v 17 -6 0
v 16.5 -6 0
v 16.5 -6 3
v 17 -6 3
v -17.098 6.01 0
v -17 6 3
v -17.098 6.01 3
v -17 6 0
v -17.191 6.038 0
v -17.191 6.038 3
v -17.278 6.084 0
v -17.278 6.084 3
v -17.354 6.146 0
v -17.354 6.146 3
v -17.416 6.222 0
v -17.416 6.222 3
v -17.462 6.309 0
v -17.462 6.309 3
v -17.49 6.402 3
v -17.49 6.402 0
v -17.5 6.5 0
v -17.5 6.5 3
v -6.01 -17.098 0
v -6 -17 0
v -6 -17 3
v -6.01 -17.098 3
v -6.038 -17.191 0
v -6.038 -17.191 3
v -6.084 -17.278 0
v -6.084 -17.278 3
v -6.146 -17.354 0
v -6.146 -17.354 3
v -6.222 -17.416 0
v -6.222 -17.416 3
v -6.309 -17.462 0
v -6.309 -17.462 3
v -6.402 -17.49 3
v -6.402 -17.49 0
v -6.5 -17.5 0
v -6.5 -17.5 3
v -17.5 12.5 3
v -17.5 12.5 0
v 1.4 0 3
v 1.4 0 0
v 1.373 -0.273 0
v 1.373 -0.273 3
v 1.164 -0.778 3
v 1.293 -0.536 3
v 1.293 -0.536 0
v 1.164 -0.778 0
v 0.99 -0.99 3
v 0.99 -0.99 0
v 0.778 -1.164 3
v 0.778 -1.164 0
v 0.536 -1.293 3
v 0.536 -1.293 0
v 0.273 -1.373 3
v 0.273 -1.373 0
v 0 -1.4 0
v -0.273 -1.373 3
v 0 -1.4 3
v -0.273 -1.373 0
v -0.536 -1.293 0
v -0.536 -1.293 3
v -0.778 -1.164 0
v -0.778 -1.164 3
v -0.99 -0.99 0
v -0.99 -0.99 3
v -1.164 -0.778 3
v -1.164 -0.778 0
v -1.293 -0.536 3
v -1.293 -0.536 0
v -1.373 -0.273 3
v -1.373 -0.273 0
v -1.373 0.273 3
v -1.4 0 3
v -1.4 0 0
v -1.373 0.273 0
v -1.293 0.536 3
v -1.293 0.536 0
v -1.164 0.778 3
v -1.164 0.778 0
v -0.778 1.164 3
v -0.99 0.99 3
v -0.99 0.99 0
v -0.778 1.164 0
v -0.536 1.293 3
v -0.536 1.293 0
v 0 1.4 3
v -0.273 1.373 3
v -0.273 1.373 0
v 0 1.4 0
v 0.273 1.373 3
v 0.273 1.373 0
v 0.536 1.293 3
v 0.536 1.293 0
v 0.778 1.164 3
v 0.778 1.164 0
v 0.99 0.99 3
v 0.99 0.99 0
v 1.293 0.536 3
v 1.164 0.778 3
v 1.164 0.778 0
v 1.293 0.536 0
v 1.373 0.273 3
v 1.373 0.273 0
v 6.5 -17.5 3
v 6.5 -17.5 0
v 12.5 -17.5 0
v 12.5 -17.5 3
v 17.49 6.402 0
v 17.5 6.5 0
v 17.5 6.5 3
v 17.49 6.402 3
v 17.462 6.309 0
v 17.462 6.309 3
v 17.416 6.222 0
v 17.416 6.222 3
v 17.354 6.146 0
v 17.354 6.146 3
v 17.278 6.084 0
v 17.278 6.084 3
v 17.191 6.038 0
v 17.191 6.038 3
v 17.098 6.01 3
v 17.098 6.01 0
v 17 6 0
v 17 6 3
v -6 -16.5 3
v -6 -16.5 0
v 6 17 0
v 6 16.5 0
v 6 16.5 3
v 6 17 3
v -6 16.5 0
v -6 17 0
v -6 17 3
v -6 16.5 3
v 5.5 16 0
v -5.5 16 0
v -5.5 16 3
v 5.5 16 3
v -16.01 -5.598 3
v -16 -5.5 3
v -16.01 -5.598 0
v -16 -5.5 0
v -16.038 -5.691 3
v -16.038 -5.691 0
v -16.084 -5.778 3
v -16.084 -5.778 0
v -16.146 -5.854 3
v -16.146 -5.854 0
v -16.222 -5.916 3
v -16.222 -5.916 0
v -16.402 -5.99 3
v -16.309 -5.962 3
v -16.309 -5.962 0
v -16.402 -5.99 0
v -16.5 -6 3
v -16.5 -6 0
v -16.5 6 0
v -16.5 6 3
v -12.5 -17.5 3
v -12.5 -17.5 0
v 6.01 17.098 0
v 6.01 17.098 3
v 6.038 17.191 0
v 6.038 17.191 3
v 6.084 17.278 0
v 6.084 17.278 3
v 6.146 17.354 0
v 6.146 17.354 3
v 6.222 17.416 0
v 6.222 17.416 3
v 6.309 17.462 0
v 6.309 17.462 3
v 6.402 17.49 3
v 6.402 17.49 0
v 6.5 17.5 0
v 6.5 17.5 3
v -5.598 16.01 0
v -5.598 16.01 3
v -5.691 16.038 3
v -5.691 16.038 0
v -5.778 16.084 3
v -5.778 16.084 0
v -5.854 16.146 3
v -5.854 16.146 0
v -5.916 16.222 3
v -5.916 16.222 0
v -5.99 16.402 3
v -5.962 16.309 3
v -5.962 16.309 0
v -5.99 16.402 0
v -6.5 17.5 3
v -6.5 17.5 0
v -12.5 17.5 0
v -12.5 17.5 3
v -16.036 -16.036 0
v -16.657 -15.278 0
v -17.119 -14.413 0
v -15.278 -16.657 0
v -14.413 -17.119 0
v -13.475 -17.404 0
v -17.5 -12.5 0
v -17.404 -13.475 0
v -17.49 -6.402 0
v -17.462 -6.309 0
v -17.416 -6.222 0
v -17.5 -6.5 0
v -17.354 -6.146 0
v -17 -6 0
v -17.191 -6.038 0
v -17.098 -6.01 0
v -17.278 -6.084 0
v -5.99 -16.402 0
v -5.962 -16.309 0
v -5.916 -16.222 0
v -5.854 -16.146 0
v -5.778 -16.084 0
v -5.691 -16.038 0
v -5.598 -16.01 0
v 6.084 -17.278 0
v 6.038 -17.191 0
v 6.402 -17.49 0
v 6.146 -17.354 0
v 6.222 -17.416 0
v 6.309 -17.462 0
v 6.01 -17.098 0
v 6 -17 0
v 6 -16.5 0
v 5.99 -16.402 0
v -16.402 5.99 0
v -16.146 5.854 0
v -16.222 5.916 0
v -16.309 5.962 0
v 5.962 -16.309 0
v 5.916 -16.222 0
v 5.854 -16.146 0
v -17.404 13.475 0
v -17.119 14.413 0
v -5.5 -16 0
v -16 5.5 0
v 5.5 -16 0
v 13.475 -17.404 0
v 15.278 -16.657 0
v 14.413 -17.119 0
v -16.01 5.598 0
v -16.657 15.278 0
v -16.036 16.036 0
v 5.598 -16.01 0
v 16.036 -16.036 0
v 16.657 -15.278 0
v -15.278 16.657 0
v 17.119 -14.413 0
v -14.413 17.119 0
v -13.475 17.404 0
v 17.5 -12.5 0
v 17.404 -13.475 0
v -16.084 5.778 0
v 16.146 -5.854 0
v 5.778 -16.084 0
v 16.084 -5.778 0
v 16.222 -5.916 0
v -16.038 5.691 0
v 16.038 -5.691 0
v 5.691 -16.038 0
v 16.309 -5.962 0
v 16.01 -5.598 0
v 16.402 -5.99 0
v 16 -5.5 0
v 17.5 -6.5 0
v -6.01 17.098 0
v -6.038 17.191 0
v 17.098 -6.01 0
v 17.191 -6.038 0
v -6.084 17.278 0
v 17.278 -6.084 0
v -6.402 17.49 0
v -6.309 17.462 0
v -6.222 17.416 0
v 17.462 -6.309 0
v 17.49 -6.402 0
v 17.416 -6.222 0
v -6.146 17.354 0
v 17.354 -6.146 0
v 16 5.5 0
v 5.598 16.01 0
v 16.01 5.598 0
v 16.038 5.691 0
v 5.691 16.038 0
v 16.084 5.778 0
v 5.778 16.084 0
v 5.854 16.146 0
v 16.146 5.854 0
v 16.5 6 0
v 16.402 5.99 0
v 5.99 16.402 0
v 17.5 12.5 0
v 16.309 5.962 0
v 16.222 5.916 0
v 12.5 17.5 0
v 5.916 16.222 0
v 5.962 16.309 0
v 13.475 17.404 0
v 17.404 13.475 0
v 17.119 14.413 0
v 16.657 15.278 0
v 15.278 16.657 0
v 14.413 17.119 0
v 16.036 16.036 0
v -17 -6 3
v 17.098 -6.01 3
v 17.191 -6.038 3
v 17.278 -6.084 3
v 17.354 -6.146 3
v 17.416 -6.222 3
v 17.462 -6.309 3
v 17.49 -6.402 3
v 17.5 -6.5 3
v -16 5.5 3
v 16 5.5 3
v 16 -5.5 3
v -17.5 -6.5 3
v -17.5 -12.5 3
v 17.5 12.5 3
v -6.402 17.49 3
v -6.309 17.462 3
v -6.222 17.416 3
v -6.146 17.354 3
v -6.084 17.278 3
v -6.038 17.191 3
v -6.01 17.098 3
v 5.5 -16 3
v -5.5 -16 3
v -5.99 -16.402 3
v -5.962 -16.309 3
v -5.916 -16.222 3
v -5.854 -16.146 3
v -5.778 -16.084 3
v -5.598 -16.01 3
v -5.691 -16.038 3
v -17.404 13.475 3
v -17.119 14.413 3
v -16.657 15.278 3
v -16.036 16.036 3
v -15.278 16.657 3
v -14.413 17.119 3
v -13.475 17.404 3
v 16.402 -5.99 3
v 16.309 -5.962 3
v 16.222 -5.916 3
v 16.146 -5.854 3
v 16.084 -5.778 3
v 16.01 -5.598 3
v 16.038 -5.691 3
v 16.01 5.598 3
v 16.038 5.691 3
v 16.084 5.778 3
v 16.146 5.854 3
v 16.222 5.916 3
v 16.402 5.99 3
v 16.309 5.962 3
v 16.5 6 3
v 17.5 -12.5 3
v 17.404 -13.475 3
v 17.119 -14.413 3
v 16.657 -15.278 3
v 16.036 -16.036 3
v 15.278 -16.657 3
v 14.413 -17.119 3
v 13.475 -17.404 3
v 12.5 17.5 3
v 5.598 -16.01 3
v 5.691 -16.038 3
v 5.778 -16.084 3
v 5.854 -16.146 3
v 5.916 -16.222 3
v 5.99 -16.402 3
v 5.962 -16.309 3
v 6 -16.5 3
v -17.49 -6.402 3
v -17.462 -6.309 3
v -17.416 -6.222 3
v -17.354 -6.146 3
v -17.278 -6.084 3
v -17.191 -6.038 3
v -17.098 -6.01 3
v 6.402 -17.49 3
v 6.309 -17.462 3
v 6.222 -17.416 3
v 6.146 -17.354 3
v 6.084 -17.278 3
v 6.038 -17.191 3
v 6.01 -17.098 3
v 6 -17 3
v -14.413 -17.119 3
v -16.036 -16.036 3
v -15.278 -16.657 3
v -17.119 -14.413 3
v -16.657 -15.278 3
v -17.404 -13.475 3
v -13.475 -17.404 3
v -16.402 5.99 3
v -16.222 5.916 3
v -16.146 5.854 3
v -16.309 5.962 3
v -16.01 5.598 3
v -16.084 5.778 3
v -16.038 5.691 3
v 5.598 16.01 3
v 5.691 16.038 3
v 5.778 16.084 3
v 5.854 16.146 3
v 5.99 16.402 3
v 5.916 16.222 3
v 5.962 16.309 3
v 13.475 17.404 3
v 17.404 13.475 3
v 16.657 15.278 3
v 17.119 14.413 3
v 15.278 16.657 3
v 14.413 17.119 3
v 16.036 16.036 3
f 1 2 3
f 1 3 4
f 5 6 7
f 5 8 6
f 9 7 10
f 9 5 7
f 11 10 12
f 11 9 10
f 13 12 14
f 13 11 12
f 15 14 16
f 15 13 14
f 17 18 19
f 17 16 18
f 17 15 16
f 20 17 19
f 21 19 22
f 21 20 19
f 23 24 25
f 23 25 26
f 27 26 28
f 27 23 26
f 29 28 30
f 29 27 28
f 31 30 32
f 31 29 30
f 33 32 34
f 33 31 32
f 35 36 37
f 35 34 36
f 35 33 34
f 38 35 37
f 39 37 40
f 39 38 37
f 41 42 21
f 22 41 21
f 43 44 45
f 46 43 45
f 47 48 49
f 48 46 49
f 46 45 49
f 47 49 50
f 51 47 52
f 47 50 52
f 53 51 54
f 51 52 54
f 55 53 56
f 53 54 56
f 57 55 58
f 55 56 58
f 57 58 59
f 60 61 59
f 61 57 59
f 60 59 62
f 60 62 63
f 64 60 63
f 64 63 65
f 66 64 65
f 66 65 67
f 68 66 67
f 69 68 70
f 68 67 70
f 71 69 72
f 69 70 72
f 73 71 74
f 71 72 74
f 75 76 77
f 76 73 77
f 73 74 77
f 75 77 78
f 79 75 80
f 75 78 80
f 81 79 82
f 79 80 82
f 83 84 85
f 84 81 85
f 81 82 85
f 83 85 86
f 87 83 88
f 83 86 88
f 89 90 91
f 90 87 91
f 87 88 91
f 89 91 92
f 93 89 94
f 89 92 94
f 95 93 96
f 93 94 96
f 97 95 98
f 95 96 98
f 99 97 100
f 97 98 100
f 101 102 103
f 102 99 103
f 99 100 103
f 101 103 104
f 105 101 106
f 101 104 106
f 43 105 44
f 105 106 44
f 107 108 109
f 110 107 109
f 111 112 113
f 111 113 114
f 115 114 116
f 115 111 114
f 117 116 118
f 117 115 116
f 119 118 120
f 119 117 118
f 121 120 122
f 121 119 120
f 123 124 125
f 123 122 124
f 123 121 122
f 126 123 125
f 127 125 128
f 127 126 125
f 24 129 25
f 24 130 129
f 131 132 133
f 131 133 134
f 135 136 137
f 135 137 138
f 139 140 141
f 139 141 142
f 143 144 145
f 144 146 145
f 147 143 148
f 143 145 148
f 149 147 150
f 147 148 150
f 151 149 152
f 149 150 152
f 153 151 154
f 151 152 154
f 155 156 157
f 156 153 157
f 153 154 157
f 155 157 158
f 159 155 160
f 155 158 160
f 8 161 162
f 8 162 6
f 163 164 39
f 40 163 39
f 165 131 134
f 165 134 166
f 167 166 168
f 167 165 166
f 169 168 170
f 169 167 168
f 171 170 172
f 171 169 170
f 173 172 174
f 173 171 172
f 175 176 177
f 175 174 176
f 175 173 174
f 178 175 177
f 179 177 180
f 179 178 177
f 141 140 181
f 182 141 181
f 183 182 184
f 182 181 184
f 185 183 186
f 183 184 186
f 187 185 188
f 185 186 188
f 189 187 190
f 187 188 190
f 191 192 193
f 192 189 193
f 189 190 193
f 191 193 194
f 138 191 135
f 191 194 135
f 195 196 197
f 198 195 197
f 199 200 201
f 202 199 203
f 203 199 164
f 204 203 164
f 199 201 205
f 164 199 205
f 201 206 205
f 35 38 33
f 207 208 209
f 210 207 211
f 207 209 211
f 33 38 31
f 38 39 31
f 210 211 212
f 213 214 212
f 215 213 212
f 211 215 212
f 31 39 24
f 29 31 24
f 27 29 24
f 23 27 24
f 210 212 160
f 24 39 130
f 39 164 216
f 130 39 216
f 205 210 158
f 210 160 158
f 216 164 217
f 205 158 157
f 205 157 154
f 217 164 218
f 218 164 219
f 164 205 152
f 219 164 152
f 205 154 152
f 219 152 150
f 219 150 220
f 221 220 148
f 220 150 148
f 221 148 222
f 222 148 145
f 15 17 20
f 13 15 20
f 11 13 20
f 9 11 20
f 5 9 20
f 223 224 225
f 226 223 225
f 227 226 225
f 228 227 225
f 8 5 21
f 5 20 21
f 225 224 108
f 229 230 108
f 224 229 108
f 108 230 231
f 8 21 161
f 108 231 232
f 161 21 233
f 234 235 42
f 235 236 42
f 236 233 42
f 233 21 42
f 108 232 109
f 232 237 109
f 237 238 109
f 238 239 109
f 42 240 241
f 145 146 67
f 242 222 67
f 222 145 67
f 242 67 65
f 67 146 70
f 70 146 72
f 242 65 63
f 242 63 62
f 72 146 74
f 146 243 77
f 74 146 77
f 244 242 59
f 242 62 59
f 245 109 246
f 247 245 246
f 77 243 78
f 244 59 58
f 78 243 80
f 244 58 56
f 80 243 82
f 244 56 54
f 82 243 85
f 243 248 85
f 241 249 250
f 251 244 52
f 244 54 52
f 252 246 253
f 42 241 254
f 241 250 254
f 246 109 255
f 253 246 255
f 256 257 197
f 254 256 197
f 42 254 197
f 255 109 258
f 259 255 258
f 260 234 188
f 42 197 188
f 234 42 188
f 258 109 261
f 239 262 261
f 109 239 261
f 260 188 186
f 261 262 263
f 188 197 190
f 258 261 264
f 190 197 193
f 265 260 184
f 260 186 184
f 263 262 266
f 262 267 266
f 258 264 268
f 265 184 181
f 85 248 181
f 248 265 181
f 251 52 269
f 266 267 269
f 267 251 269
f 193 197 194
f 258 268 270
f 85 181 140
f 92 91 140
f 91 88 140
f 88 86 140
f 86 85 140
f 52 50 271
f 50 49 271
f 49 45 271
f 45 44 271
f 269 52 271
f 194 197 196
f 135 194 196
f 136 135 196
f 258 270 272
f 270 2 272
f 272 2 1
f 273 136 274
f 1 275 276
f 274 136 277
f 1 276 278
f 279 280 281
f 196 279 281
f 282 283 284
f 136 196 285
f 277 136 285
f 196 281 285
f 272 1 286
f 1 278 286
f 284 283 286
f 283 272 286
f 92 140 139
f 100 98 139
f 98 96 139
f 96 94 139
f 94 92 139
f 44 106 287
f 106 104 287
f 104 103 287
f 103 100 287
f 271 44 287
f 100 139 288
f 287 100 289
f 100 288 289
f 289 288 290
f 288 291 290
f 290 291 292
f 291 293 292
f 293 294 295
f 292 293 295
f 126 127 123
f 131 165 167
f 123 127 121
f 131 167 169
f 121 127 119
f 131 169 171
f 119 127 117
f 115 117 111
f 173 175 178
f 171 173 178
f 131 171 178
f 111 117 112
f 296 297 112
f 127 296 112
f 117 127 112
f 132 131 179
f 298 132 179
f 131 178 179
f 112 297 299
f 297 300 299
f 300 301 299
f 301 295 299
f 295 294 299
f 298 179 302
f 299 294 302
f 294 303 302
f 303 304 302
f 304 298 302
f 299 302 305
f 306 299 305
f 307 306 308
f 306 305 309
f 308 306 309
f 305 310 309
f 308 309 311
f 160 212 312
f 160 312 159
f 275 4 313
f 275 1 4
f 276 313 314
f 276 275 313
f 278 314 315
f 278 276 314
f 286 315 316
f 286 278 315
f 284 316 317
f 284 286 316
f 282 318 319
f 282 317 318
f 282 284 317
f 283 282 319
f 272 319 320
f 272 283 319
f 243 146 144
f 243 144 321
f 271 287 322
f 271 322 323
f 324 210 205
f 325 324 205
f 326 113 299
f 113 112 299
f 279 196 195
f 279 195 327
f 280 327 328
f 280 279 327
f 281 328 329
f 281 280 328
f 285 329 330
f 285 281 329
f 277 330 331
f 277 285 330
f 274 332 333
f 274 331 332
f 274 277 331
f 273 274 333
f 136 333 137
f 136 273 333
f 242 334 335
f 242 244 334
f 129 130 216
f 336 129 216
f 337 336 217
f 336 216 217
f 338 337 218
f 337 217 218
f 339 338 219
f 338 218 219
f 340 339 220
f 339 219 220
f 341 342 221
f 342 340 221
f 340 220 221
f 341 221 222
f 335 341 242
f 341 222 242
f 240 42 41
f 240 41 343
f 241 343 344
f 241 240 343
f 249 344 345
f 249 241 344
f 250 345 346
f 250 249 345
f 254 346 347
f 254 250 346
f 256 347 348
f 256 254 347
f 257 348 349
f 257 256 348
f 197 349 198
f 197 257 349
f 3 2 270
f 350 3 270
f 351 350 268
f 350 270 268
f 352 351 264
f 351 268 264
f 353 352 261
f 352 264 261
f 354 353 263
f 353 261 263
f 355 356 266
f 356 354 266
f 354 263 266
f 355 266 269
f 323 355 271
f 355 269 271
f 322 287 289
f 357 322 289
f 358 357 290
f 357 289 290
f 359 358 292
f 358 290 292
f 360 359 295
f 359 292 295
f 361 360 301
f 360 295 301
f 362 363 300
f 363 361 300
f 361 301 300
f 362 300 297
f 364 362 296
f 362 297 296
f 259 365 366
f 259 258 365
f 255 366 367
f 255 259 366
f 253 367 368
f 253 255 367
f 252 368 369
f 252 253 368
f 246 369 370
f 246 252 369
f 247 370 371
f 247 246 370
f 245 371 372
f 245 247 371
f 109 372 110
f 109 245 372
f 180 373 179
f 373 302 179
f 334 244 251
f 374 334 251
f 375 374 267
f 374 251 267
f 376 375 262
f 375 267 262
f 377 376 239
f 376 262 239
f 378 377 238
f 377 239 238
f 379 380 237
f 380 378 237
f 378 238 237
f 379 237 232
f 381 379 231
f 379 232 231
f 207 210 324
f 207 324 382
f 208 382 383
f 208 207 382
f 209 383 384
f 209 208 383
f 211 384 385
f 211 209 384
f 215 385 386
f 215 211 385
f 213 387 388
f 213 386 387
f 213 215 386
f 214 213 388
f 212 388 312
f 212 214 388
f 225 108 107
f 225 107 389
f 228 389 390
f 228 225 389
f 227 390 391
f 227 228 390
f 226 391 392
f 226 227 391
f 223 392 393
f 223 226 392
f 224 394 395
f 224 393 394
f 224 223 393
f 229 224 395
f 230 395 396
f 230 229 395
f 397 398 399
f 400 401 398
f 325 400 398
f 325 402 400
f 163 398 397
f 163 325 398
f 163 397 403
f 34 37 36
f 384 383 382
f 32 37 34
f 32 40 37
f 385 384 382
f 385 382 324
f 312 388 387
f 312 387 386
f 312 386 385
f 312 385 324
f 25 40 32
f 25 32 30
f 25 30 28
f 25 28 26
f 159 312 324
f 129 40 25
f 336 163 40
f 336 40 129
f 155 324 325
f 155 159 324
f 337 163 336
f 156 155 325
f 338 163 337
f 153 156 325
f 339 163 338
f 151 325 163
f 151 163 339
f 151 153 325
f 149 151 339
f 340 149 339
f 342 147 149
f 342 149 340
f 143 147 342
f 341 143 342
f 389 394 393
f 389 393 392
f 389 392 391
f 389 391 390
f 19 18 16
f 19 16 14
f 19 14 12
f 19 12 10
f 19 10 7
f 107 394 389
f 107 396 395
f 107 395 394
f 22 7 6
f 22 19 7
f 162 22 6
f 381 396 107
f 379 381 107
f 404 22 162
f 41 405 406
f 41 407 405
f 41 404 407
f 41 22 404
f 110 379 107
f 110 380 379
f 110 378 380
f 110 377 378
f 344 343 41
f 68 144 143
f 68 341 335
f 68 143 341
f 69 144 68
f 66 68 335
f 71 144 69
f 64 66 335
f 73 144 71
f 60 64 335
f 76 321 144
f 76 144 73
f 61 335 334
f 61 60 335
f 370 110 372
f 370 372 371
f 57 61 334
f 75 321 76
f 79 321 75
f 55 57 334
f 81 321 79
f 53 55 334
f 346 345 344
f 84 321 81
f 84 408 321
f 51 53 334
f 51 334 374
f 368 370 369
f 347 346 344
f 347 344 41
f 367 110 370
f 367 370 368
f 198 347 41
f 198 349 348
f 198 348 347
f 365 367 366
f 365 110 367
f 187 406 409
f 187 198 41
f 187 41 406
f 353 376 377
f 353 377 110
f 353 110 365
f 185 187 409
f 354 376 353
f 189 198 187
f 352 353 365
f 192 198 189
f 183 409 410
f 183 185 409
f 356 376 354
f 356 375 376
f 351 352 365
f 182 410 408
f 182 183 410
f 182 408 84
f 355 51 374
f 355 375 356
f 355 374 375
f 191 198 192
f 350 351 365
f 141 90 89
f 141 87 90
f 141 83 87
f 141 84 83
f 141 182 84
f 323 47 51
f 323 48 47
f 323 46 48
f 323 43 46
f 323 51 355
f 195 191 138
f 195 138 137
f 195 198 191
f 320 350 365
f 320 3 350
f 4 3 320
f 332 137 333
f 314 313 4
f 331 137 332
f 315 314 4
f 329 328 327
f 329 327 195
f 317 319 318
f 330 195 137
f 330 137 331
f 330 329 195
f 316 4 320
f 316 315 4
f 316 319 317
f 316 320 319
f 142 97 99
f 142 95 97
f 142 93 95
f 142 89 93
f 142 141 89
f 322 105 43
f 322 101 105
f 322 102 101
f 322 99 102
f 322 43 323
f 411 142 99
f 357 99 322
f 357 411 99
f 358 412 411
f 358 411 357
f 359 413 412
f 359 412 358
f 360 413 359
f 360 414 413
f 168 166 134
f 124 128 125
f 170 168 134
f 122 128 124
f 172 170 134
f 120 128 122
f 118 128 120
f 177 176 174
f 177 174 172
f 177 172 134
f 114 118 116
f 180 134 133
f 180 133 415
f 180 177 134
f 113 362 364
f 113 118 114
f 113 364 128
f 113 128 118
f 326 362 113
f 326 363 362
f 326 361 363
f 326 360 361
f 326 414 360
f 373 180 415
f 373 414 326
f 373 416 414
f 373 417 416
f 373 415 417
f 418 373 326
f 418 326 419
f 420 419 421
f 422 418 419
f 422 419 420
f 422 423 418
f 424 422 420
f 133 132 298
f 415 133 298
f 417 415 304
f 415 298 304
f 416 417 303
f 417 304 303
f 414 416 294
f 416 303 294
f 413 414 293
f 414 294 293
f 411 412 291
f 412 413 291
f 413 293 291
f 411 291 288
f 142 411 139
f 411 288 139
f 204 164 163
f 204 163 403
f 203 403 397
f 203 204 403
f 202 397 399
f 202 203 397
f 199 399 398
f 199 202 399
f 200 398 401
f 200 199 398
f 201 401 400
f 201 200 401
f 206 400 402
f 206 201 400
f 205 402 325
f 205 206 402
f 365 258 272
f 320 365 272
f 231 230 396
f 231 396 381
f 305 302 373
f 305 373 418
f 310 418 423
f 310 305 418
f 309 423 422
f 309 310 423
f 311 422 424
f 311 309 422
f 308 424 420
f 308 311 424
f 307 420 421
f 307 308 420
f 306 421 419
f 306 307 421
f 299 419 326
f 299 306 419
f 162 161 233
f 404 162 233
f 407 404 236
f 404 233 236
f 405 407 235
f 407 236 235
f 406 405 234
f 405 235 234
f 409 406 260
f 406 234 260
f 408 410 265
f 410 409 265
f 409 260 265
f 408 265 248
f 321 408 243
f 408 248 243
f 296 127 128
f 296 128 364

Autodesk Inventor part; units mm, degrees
ref_plane "YZ Plane" through (0, 0, 0) normal (1, 0, 0) x (0, 1, 0)
ref_plane "XZ Plane" through (0, 0, 0) normal (0, 1, 0) x (-1, 0, 0)
ref_plane "XY Plane" through (0, 0, 0) normal (0, 0, 1) x (1, 0, 0)
sketch "Sketch1" plane through (0, 0, 0) normal (0, 0, 1) x (1, 0, 0)
  circle A0 centre (0, 0) radius 16 construction
  line L0 (17.5, 17.5) -> (-17.5, -17.5) construction
  line L1 (-17.5, 17.5) -> (17.5, -17.5) construction
  line L2 (-17, -6) -> (-16.5, -6)
  line L3 (-16, -5.5) -> (-16, 5.5)
  line L4 (-16.5, 6) -> (-17, 6)
  line L5 (-17.5, 12.5) -> (-17.5, 6.5)
  line L6 (-17.5, -6.5) -> (-17.5, -12.5)
  arc A1 (-16.5, -6) -> (-16, -5.5) centre (-16.5, -5.5) ccw
  arc A2 (-16, 5.5) -> (-16.5, 6) centre (-16.5, 5.5) ccw
  arc A3 (-17.5, 6.5) -> (-17, 6) centre (-17, 6.5) ccw
  arc A4 (-17, -6) -> (-17.5, -6.5) centre (-17, -6.5) ccw
  line L7 (6, -17) -> (6, -16.5)
  line L8 (5.5, -16) -> (-5.5, -16)
  line L9 (-6, -16.5) -> (-6, -17)
  arc A5 (6, -16.5) -> (5.5, -16) centre (5.5, -16.5) ccw
  arc A6 (-5.5, -16) -> (-6, -16.5) centre (-5.5, -16.5) ccw
  arc A7 (-6.5, -17.5) -> (-6, -17) centre (-6.5, -17) ccw
  arc A8 (6, -17) -> (6.5, -17.5) centre (6.5, -17) ccw
  line L10 (17, 6) -> (16.5, 6)
  line L11 (16, 5.5) -> (16, -5.5)
  line L12 (16.5, -6) -> (17, -6)
  arc A9 (16.5, 6) -> (16, 5.5) centre (16.5, 5.5) ccw
  arc A10 (16, -5.5) -> (16.5, -6) centre (16.5, -5.5) ccw
  arc A11 (17.5, -6.5) -> (17, -6) centre (17, -6.5) ccw
  arc A12 (17, 6) -> (17.5, 6.5) centre (17, 6.5) ccw
  line L13 (-6, 17) -> (-6, 16.5)
  line L14 (-5.5, 16) -> (5.5, 16)
  line L15 (6, 16.5) -> (6, 17)
  arc A13 (-6, 16.5) -> (-5.5, 16) centre (-5.5, 16.5) ccw
  arc A14 (5.5, 16) -> (6, 16.5) centre (5.5, 16.5) ccw
  arc A15 (6.5, 17.5) -> (6, 17) centre (6.5, 17) ccw
  arc A16 (-6, 17) -> (-6.5, 17.5) centre (-6.5, 17) ccw
  line L16 (12.5, 17.5) -> (6.5, 17.5)
  line L17 (-6.5, 17.5) -> (-12.5, 17.5)
  line L18 (17.5, -12.5) -> (17.5, -6.5)
  line L19 (17.5, 6.5) -> (17.5, 12.5)
  line L20 (-12.5, -17.5) -> (-6.5, -17.5)
  line L21 (6.5, -17.5) -> (12.5, -17.5)
  arc A17 (-17.5, -12.5) -> (-12.5, -17.5) centre (-12.5, -12.5) ccw
  arc A18 (-12.5, 17.5) -> (-17.5, 12.5) centre (-12.5, 12.5) ccw
  arc A19 (17.5, 12.5) -> (12.5, 17.5) centre (12.5, 12.5) ccw
  arc A20 (12.5, -17.5) -> (17.5, -12.5) centre (12.5, -12.5) ccw
  circle A21 centre (0, 0) radius 1.4
  point P0 (16, 0)
  point P1 (0, 0)
  point P2 (-16, 6)
  point P3 (-16, -6)
  point P4 (-16, 0)
  point P5 (-6, -16)
  point P6 (6, -16)
  point P7 (0, -16)
  point P8 (16, -6)
  point P9 (16, 6)
  point P10 (6, 16)
  point P11 (-6, 16)
  point P12 (0, 16)
  dimension "d17" = 16
  dimension "d39" = 35
  dimension "d44" = 12
  dimension "d45" = 0.5
  dimension "d48" = 360
  dimension "d50" = 5
  dimension "d53" = 2.8
extrude "Extrusion6" add sketch "Sketch1" along normal blind 3
properties part number "290814 Forward Outer Endcap" material "Polycarbonate, Clear"
